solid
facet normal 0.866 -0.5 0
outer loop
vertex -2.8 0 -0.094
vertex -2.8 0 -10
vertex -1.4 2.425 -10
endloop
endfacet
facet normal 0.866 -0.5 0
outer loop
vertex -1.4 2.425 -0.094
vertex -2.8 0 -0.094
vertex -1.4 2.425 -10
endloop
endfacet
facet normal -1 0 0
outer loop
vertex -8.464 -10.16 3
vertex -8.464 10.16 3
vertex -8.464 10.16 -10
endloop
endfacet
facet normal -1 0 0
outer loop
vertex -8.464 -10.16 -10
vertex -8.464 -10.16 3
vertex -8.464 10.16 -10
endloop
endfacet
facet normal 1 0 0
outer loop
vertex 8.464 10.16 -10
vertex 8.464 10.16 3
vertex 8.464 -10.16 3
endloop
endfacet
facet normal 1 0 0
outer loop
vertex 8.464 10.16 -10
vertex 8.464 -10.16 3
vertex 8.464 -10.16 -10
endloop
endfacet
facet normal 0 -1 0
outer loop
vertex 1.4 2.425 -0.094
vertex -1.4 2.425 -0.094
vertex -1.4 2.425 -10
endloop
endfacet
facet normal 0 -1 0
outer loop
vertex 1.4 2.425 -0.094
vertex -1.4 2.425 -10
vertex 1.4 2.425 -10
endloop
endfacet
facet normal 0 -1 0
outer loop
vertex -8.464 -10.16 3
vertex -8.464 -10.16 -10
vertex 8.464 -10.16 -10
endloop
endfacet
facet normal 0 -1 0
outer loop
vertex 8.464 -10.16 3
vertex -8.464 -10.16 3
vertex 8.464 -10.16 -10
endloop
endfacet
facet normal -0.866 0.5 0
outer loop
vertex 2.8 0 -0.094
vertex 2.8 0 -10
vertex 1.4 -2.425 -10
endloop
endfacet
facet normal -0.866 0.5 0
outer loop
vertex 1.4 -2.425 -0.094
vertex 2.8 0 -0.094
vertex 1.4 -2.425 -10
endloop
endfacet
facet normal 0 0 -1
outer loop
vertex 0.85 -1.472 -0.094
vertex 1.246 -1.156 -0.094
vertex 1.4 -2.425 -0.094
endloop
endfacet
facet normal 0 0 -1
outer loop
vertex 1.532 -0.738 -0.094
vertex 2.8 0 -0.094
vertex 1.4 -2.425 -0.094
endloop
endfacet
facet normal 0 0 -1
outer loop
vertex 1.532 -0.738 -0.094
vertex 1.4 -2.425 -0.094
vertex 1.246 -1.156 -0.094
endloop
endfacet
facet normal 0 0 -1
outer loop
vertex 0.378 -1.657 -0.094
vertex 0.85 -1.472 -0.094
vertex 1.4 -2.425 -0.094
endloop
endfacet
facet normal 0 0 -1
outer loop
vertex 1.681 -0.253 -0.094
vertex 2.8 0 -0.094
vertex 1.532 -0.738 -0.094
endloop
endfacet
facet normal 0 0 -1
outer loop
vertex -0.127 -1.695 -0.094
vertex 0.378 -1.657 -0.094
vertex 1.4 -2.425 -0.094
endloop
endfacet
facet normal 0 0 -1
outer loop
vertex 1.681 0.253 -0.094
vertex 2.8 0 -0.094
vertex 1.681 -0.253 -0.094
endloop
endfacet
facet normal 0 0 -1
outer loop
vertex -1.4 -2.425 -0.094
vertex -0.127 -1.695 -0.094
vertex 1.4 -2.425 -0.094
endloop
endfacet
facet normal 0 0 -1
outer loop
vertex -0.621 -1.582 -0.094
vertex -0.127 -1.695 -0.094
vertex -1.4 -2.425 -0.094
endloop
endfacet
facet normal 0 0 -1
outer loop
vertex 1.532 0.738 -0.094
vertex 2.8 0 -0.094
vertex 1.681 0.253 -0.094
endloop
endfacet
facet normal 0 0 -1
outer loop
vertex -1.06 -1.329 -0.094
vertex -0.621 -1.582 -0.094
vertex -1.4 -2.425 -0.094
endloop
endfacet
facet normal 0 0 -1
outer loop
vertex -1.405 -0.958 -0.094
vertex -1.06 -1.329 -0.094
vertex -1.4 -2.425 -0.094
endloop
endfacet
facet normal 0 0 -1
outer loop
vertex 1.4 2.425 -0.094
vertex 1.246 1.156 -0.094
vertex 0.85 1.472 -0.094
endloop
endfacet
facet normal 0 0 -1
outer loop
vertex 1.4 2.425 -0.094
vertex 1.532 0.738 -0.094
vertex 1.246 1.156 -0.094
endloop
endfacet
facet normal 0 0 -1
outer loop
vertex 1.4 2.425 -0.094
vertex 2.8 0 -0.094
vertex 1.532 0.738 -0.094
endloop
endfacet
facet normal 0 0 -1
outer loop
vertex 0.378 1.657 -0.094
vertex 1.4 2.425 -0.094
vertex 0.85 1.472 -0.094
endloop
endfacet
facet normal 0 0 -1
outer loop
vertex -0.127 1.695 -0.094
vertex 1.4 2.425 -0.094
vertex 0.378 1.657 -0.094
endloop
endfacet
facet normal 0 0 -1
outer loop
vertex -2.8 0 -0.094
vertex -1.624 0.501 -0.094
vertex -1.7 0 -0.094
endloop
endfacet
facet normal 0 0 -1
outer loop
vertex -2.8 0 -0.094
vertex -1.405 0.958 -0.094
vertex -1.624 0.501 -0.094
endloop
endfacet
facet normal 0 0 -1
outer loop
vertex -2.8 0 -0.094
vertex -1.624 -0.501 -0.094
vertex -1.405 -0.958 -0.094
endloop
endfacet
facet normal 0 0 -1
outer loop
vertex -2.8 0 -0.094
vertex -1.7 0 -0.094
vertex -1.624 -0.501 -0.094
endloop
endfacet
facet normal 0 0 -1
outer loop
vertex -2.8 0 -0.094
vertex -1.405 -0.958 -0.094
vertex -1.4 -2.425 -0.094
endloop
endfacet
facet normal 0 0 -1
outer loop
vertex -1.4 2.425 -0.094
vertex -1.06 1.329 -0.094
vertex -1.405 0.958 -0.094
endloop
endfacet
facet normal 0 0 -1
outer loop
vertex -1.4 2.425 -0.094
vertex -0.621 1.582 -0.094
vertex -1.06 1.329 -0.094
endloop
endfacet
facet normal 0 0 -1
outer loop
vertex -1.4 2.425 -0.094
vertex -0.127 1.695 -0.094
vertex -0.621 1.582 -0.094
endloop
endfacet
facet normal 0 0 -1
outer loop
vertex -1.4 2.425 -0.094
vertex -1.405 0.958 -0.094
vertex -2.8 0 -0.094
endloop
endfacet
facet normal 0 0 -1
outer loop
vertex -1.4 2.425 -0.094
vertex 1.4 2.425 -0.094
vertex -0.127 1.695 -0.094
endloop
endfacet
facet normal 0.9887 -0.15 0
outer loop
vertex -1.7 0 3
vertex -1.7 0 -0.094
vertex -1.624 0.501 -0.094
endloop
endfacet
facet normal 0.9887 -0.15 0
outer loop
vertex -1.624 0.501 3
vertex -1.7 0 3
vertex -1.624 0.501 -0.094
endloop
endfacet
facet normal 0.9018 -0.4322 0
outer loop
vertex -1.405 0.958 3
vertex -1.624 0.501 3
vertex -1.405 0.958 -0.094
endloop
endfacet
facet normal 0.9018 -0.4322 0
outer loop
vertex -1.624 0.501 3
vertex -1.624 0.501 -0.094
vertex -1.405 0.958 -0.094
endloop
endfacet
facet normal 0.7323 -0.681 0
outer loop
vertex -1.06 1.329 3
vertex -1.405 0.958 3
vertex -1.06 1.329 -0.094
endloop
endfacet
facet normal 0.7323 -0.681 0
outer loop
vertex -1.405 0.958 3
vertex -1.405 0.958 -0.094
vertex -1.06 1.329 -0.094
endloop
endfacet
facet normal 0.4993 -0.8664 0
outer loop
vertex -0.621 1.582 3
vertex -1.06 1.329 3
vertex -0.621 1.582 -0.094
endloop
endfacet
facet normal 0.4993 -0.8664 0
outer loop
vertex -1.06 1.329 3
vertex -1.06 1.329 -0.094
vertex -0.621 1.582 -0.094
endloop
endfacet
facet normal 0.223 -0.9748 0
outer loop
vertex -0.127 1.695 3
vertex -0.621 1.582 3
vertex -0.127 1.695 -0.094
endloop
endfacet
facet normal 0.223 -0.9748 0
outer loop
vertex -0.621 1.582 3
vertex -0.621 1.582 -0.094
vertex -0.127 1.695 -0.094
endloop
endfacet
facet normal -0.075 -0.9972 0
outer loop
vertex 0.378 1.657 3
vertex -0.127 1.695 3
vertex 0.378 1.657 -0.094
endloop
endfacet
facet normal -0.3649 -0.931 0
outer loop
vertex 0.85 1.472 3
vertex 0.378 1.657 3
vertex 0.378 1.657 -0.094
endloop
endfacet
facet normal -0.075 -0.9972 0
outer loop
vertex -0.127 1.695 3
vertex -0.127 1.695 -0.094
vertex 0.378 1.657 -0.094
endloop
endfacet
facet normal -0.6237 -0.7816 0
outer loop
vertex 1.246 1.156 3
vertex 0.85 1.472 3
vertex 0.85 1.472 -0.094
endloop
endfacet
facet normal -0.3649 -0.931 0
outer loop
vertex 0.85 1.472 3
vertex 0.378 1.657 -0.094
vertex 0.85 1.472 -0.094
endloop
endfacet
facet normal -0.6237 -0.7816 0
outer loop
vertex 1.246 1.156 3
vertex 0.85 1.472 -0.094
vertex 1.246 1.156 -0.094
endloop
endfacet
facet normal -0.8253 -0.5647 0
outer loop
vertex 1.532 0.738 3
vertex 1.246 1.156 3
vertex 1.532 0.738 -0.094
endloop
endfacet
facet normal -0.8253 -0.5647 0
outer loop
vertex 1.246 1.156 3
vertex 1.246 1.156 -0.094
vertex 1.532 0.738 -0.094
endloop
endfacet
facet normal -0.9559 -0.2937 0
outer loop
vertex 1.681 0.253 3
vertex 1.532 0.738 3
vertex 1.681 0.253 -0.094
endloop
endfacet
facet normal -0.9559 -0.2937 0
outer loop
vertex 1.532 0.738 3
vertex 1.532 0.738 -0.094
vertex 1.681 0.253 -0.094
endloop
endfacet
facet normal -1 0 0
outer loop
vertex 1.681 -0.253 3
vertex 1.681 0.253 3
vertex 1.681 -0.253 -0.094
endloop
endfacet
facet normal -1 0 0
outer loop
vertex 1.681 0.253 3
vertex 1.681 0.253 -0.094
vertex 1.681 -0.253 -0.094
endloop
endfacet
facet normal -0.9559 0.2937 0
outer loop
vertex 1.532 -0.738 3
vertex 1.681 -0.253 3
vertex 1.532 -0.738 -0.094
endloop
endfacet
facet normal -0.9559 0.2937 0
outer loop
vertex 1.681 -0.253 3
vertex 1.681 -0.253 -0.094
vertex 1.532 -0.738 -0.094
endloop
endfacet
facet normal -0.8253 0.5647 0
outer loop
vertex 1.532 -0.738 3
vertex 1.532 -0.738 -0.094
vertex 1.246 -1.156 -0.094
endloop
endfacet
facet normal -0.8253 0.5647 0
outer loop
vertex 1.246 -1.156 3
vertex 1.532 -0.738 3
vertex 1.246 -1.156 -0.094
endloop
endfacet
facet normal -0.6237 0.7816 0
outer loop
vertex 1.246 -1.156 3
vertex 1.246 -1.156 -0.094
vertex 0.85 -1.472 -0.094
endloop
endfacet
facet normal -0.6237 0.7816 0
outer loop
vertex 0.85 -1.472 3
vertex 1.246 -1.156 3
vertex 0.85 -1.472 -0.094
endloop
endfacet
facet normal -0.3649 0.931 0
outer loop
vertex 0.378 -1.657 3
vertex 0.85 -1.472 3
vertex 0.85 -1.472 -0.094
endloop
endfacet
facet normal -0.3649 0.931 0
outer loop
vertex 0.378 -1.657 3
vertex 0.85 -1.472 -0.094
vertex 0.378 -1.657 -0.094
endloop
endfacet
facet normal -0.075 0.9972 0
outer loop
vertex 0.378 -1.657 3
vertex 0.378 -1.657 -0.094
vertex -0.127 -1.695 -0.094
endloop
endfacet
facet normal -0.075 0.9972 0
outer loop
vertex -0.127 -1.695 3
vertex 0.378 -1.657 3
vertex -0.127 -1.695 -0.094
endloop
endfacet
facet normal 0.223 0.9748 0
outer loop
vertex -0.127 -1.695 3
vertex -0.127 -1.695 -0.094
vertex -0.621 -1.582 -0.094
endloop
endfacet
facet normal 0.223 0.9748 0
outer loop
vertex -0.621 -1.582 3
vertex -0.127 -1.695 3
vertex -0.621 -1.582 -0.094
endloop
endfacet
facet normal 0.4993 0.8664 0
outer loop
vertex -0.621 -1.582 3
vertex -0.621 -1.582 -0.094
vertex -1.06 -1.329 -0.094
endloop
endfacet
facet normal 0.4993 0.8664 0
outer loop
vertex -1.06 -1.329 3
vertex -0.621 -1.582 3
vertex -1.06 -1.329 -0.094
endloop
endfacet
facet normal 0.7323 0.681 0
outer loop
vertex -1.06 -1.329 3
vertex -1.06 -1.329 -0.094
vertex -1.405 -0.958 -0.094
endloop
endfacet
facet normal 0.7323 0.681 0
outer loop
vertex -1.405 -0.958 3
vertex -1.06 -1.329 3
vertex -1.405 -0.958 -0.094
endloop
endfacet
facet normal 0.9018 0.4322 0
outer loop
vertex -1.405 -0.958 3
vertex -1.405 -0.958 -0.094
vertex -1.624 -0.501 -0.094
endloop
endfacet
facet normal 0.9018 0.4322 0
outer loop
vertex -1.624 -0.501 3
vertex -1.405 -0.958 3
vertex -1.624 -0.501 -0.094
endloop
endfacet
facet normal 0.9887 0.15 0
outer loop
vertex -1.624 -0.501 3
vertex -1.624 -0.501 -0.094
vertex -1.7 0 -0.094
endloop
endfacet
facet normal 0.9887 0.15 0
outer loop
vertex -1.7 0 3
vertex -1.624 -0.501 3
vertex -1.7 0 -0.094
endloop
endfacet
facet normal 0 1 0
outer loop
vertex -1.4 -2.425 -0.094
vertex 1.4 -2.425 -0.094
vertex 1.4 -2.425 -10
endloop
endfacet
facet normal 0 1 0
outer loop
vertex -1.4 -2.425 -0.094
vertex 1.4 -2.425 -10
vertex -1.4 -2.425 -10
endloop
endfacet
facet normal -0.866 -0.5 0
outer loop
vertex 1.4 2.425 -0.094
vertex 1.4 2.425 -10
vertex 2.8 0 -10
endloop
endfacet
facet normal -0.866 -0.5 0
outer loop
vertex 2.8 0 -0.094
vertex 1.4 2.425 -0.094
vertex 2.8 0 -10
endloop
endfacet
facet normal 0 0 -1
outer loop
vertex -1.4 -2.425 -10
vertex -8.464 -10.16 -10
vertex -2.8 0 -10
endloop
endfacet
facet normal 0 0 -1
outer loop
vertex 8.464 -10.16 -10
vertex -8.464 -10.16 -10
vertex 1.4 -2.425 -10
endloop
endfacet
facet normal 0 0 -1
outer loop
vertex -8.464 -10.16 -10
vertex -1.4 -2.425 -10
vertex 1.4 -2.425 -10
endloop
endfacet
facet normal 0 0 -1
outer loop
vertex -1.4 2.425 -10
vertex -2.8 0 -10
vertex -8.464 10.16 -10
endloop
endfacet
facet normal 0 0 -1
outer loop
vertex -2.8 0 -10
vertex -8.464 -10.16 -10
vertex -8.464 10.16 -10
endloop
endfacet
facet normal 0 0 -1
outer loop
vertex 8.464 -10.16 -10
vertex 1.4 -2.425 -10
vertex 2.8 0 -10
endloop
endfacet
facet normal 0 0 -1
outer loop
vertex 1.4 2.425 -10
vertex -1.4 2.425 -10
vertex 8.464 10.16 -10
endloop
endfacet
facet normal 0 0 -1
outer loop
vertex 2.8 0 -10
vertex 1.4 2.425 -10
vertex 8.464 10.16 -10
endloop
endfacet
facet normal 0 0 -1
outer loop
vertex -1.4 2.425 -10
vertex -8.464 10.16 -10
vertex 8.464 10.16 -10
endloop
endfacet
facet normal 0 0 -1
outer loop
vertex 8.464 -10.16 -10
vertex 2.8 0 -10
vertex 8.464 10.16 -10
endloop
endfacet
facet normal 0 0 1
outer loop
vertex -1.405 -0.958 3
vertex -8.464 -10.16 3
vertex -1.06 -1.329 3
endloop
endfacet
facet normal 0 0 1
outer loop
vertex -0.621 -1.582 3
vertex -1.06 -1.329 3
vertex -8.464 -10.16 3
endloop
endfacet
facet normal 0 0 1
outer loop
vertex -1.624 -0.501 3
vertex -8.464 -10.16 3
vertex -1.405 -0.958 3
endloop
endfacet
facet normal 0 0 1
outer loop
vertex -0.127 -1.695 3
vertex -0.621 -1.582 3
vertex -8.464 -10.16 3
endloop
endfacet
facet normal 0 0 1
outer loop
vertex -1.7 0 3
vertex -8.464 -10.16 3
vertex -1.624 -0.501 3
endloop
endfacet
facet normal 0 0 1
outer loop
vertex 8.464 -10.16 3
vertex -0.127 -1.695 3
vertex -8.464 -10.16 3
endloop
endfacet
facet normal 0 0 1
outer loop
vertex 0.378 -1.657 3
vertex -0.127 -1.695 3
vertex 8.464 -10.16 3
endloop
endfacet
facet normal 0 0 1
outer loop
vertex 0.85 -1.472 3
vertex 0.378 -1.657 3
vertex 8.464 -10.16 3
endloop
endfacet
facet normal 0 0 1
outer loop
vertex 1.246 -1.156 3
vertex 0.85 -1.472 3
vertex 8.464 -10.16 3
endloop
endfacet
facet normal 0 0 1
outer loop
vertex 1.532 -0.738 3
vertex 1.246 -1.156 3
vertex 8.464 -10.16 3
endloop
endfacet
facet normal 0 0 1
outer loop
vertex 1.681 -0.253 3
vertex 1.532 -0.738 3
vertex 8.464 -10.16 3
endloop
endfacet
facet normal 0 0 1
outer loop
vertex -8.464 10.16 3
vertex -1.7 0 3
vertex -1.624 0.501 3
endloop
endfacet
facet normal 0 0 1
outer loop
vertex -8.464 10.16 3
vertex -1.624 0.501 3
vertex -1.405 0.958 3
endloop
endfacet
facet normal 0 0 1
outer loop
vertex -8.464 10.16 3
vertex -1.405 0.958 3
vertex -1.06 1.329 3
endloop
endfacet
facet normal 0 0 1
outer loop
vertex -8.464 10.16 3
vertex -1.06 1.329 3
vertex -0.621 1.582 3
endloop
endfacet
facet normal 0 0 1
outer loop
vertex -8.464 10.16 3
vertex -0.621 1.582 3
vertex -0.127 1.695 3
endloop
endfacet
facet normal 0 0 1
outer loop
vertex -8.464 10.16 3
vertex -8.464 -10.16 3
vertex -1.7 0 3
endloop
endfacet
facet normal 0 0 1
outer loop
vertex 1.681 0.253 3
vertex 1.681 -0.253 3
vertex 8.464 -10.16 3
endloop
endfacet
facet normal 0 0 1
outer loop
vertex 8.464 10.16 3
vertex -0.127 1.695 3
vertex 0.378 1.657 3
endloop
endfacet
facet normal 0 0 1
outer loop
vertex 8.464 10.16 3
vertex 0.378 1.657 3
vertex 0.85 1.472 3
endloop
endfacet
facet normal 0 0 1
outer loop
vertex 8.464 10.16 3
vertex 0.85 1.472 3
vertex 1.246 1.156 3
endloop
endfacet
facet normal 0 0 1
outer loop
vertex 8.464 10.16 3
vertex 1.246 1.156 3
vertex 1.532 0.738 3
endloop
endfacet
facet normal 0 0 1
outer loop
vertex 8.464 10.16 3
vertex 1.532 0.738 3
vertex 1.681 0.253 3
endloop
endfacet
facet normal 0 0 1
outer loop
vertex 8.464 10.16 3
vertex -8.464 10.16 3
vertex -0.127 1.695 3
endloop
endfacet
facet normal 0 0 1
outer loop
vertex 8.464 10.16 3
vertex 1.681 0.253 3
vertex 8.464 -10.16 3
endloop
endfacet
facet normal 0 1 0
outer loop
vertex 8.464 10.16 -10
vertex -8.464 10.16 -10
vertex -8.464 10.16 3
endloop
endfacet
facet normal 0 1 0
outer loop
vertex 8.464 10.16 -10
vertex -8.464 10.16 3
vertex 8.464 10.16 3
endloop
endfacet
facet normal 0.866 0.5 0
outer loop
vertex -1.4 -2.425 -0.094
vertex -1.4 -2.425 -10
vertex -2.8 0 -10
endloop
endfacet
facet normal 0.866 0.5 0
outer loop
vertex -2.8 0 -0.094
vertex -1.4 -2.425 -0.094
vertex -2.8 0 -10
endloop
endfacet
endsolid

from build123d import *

# Parameters (mm, degrees)
SKETCH1_W           = 16.9288177
SKETCH1_H           = 13
BOSS_EXTRUDE1_DEPTH = 10.16
SKETCH2_R           = 1.7
CUT_EXTRUDE1_DEPTH  = 9.906
SKETCH2_3_R         = 1.7
CUT_EXTRUDE2_DEPTH  = 15.748


with BuildPart() as part:
    # Sketch1 → Boss-Extrude1 (new, symmetric)
    with BuildSketch(Plane(origin=(0, 0, 0), x_dir=(1, 0, 0), z_dir=(0, 1, 0))):
        with Locations((0, 3.5)):
            Rectangle(SKETCH1_W, SKETCH1_H)
    extrude(amount=BOSS_EXTRUDE1_DEPTH, both=True)

    # Sketch2 → Cut-Extrude1 (cut)
    with BuildSketch(Plane(origin=(0, 0, -10), x_dir=(-1, 0, 0), z_dir=(0, 0, -1))):
        Polygon((1.400074403, -2.425), (2.800148806, 0), (1.400074403, 2.425), (-1.400074403, 2.425), (-2.800148806, 0), (-1.400074403, -2.425), align=None)
        Circle(SKETCH2_R, mode=Mode.SUBTRACT)
    extrude(amount=-CUT_EXTRUDE1_DEPTH, mode=Mode.SUBTRACT)

    # Sketch2<3> → Cut-Extrude2 (cut)
    with BuildSketch(Plane(origin=(0, 0, -10), x_dir=(-1, 0, 0), z_dir=(0, 0, -1))):
        Circle(SKETCH2_3_R)
    extrude(amount=-CUT_EXTRUDE2_DEPTH, mode=Mode.SUBTRACT)


solid = part.part
